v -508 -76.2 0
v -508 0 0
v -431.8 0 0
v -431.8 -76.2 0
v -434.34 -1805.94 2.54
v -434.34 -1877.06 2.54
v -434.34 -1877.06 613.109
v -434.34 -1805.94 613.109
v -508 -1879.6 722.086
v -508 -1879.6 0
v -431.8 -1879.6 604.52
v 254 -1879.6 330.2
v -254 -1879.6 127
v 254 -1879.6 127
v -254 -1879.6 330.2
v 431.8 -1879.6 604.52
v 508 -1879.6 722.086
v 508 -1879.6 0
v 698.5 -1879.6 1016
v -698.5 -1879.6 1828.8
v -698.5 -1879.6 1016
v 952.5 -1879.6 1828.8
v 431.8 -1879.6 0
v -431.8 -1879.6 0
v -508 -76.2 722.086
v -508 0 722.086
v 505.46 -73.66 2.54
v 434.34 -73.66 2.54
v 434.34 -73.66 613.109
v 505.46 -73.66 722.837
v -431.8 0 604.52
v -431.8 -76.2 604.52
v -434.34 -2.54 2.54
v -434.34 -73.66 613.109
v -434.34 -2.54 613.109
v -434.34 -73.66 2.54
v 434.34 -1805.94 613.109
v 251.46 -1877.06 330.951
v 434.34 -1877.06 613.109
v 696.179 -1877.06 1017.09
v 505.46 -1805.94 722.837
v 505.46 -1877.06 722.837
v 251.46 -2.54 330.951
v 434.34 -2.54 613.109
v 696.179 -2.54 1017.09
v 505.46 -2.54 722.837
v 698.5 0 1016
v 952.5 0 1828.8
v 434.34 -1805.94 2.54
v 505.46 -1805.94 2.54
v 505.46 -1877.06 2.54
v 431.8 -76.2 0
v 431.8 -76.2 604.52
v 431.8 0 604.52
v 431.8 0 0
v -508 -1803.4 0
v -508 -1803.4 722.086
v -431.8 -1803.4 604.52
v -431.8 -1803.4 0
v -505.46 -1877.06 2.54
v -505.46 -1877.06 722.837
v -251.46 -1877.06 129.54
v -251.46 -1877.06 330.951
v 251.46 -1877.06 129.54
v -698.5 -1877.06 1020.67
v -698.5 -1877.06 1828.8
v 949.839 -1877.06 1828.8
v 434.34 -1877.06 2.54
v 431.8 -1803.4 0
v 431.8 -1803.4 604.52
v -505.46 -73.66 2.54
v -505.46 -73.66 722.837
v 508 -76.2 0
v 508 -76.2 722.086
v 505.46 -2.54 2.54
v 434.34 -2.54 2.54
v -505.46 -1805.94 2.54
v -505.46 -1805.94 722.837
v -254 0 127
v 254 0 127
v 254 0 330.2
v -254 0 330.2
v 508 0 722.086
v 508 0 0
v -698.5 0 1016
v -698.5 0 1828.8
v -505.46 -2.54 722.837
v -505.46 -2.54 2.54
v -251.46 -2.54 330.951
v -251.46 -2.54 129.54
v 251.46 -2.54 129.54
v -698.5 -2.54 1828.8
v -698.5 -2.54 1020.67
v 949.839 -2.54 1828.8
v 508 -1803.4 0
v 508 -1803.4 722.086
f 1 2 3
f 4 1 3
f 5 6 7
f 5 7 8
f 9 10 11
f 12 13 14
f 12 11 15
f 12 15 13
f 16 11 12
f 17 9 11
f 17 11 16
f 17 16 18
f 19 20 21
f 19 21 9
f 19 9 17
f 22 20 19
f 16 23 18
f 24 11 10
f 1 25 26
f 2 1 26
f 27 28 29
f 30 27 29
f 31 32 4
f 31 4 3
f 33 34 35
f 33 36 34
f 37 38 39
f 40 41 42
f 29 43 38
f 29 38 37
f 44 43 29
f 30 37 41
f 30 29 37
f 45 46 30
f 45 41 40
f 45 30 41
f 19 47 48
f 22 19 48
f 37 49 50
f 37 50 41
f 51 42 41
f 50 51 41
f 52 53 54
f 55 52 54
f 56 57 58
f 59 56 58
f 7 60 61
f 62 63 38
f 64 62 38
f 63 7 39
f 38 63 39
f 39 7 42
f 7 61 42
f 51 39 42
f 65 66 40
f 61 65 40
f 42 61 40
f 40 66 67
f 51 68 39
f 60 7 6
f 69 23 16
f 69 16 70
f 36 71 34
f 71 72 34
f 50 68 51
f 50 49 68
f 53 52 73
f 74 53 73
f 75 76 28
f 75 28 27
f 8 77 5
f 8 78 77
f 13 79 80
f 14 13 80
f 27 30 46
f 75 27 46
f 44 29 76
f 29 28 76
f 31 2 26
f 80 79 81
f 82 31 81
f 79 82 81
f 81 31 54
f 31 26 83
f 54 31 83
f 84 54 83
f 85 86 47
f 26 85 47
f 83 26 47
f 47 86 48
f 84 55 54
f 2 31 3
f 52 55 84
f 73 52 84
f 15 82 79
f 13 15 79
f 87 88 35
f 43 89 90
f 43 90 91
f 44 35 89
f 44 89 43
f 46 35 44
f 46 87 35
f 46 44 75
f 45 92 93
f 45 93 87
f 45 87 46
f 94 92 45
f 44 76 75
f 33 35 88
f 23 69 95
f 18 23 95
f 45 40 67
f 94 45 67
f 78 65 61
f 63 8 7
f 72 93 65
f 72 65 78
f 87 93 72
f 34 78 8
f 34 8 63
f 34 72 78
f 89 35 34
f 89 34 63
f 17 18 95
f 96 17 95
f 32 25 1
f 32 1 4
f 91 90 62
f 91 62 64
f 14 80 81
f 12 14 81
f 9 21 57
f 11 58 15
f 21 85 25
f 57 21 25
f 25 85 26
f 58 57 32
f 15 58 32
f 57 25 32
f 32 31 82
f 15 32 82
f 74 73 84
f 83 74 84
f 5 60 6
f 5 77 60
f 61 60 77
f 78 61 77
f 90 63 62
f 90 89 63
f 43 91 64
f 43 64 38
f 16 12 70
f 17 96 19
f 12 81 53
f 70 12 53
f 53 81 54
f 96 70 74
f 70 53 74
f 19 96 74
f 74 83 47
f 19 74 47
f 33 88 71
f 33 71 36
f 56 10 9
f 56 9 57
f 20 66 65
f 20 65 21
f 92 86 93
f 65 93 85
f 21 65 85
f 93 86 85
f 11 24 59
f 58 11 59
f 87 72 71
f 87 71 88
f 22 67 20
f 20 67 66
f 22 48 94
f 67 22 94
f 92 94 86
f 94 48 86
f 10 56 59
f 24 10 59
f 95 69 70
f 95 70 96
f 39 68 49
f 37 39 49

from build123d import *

# Parameters (mm, degrees)
F1_DEPTH = 1879.6
F2_W     = 76.2
F2_H     = 76.2
F4_T     = -2.54


with BuildPart() as f1:
    # F0 (on Front) → F1 (new body)
    with BuildSketch(Plane.XZ):
        Polygon((-254, 127), (0, 127), (254, 127), (254, 330.2), (698.5, 1016), (952.5, 1828.8), (0, 1828.8), (-698.5, 1828.8), (-698.5, 1016), (-254, 330.2), align=None)
    extrude(amount=F1_DEPTH)

    # F2 (on Top) → F3 (join, up to the next surface of F1)
    with BuildSketch(Plane.XY):
        with Locations((-469.9, -1841.5)):
            Rectangle(F2_W, F2_H)
        with Locations((469.9, -1841.5)):
            Rectangle(F2_W, F2_H)
        with Locations((-469.9, -38.1)):
            Rectangle(F2_W, F2_H)
        with Locations((469.9, -38.1)):
            Rectangle(F2_W, F2_H)
    extrude(until=Until.NEXT)

    # F4
    f4_openings = [f1.faces().sort_by_distance(p)[0] for p in [
        (127, -939.8, 1828.8),
        (-698.5, -939.8, 1422.4),
    ]]
    offset(amount=F4_T, openings=f4_openings, kind=Kind.INTERSECTION)


solid = f1.part
